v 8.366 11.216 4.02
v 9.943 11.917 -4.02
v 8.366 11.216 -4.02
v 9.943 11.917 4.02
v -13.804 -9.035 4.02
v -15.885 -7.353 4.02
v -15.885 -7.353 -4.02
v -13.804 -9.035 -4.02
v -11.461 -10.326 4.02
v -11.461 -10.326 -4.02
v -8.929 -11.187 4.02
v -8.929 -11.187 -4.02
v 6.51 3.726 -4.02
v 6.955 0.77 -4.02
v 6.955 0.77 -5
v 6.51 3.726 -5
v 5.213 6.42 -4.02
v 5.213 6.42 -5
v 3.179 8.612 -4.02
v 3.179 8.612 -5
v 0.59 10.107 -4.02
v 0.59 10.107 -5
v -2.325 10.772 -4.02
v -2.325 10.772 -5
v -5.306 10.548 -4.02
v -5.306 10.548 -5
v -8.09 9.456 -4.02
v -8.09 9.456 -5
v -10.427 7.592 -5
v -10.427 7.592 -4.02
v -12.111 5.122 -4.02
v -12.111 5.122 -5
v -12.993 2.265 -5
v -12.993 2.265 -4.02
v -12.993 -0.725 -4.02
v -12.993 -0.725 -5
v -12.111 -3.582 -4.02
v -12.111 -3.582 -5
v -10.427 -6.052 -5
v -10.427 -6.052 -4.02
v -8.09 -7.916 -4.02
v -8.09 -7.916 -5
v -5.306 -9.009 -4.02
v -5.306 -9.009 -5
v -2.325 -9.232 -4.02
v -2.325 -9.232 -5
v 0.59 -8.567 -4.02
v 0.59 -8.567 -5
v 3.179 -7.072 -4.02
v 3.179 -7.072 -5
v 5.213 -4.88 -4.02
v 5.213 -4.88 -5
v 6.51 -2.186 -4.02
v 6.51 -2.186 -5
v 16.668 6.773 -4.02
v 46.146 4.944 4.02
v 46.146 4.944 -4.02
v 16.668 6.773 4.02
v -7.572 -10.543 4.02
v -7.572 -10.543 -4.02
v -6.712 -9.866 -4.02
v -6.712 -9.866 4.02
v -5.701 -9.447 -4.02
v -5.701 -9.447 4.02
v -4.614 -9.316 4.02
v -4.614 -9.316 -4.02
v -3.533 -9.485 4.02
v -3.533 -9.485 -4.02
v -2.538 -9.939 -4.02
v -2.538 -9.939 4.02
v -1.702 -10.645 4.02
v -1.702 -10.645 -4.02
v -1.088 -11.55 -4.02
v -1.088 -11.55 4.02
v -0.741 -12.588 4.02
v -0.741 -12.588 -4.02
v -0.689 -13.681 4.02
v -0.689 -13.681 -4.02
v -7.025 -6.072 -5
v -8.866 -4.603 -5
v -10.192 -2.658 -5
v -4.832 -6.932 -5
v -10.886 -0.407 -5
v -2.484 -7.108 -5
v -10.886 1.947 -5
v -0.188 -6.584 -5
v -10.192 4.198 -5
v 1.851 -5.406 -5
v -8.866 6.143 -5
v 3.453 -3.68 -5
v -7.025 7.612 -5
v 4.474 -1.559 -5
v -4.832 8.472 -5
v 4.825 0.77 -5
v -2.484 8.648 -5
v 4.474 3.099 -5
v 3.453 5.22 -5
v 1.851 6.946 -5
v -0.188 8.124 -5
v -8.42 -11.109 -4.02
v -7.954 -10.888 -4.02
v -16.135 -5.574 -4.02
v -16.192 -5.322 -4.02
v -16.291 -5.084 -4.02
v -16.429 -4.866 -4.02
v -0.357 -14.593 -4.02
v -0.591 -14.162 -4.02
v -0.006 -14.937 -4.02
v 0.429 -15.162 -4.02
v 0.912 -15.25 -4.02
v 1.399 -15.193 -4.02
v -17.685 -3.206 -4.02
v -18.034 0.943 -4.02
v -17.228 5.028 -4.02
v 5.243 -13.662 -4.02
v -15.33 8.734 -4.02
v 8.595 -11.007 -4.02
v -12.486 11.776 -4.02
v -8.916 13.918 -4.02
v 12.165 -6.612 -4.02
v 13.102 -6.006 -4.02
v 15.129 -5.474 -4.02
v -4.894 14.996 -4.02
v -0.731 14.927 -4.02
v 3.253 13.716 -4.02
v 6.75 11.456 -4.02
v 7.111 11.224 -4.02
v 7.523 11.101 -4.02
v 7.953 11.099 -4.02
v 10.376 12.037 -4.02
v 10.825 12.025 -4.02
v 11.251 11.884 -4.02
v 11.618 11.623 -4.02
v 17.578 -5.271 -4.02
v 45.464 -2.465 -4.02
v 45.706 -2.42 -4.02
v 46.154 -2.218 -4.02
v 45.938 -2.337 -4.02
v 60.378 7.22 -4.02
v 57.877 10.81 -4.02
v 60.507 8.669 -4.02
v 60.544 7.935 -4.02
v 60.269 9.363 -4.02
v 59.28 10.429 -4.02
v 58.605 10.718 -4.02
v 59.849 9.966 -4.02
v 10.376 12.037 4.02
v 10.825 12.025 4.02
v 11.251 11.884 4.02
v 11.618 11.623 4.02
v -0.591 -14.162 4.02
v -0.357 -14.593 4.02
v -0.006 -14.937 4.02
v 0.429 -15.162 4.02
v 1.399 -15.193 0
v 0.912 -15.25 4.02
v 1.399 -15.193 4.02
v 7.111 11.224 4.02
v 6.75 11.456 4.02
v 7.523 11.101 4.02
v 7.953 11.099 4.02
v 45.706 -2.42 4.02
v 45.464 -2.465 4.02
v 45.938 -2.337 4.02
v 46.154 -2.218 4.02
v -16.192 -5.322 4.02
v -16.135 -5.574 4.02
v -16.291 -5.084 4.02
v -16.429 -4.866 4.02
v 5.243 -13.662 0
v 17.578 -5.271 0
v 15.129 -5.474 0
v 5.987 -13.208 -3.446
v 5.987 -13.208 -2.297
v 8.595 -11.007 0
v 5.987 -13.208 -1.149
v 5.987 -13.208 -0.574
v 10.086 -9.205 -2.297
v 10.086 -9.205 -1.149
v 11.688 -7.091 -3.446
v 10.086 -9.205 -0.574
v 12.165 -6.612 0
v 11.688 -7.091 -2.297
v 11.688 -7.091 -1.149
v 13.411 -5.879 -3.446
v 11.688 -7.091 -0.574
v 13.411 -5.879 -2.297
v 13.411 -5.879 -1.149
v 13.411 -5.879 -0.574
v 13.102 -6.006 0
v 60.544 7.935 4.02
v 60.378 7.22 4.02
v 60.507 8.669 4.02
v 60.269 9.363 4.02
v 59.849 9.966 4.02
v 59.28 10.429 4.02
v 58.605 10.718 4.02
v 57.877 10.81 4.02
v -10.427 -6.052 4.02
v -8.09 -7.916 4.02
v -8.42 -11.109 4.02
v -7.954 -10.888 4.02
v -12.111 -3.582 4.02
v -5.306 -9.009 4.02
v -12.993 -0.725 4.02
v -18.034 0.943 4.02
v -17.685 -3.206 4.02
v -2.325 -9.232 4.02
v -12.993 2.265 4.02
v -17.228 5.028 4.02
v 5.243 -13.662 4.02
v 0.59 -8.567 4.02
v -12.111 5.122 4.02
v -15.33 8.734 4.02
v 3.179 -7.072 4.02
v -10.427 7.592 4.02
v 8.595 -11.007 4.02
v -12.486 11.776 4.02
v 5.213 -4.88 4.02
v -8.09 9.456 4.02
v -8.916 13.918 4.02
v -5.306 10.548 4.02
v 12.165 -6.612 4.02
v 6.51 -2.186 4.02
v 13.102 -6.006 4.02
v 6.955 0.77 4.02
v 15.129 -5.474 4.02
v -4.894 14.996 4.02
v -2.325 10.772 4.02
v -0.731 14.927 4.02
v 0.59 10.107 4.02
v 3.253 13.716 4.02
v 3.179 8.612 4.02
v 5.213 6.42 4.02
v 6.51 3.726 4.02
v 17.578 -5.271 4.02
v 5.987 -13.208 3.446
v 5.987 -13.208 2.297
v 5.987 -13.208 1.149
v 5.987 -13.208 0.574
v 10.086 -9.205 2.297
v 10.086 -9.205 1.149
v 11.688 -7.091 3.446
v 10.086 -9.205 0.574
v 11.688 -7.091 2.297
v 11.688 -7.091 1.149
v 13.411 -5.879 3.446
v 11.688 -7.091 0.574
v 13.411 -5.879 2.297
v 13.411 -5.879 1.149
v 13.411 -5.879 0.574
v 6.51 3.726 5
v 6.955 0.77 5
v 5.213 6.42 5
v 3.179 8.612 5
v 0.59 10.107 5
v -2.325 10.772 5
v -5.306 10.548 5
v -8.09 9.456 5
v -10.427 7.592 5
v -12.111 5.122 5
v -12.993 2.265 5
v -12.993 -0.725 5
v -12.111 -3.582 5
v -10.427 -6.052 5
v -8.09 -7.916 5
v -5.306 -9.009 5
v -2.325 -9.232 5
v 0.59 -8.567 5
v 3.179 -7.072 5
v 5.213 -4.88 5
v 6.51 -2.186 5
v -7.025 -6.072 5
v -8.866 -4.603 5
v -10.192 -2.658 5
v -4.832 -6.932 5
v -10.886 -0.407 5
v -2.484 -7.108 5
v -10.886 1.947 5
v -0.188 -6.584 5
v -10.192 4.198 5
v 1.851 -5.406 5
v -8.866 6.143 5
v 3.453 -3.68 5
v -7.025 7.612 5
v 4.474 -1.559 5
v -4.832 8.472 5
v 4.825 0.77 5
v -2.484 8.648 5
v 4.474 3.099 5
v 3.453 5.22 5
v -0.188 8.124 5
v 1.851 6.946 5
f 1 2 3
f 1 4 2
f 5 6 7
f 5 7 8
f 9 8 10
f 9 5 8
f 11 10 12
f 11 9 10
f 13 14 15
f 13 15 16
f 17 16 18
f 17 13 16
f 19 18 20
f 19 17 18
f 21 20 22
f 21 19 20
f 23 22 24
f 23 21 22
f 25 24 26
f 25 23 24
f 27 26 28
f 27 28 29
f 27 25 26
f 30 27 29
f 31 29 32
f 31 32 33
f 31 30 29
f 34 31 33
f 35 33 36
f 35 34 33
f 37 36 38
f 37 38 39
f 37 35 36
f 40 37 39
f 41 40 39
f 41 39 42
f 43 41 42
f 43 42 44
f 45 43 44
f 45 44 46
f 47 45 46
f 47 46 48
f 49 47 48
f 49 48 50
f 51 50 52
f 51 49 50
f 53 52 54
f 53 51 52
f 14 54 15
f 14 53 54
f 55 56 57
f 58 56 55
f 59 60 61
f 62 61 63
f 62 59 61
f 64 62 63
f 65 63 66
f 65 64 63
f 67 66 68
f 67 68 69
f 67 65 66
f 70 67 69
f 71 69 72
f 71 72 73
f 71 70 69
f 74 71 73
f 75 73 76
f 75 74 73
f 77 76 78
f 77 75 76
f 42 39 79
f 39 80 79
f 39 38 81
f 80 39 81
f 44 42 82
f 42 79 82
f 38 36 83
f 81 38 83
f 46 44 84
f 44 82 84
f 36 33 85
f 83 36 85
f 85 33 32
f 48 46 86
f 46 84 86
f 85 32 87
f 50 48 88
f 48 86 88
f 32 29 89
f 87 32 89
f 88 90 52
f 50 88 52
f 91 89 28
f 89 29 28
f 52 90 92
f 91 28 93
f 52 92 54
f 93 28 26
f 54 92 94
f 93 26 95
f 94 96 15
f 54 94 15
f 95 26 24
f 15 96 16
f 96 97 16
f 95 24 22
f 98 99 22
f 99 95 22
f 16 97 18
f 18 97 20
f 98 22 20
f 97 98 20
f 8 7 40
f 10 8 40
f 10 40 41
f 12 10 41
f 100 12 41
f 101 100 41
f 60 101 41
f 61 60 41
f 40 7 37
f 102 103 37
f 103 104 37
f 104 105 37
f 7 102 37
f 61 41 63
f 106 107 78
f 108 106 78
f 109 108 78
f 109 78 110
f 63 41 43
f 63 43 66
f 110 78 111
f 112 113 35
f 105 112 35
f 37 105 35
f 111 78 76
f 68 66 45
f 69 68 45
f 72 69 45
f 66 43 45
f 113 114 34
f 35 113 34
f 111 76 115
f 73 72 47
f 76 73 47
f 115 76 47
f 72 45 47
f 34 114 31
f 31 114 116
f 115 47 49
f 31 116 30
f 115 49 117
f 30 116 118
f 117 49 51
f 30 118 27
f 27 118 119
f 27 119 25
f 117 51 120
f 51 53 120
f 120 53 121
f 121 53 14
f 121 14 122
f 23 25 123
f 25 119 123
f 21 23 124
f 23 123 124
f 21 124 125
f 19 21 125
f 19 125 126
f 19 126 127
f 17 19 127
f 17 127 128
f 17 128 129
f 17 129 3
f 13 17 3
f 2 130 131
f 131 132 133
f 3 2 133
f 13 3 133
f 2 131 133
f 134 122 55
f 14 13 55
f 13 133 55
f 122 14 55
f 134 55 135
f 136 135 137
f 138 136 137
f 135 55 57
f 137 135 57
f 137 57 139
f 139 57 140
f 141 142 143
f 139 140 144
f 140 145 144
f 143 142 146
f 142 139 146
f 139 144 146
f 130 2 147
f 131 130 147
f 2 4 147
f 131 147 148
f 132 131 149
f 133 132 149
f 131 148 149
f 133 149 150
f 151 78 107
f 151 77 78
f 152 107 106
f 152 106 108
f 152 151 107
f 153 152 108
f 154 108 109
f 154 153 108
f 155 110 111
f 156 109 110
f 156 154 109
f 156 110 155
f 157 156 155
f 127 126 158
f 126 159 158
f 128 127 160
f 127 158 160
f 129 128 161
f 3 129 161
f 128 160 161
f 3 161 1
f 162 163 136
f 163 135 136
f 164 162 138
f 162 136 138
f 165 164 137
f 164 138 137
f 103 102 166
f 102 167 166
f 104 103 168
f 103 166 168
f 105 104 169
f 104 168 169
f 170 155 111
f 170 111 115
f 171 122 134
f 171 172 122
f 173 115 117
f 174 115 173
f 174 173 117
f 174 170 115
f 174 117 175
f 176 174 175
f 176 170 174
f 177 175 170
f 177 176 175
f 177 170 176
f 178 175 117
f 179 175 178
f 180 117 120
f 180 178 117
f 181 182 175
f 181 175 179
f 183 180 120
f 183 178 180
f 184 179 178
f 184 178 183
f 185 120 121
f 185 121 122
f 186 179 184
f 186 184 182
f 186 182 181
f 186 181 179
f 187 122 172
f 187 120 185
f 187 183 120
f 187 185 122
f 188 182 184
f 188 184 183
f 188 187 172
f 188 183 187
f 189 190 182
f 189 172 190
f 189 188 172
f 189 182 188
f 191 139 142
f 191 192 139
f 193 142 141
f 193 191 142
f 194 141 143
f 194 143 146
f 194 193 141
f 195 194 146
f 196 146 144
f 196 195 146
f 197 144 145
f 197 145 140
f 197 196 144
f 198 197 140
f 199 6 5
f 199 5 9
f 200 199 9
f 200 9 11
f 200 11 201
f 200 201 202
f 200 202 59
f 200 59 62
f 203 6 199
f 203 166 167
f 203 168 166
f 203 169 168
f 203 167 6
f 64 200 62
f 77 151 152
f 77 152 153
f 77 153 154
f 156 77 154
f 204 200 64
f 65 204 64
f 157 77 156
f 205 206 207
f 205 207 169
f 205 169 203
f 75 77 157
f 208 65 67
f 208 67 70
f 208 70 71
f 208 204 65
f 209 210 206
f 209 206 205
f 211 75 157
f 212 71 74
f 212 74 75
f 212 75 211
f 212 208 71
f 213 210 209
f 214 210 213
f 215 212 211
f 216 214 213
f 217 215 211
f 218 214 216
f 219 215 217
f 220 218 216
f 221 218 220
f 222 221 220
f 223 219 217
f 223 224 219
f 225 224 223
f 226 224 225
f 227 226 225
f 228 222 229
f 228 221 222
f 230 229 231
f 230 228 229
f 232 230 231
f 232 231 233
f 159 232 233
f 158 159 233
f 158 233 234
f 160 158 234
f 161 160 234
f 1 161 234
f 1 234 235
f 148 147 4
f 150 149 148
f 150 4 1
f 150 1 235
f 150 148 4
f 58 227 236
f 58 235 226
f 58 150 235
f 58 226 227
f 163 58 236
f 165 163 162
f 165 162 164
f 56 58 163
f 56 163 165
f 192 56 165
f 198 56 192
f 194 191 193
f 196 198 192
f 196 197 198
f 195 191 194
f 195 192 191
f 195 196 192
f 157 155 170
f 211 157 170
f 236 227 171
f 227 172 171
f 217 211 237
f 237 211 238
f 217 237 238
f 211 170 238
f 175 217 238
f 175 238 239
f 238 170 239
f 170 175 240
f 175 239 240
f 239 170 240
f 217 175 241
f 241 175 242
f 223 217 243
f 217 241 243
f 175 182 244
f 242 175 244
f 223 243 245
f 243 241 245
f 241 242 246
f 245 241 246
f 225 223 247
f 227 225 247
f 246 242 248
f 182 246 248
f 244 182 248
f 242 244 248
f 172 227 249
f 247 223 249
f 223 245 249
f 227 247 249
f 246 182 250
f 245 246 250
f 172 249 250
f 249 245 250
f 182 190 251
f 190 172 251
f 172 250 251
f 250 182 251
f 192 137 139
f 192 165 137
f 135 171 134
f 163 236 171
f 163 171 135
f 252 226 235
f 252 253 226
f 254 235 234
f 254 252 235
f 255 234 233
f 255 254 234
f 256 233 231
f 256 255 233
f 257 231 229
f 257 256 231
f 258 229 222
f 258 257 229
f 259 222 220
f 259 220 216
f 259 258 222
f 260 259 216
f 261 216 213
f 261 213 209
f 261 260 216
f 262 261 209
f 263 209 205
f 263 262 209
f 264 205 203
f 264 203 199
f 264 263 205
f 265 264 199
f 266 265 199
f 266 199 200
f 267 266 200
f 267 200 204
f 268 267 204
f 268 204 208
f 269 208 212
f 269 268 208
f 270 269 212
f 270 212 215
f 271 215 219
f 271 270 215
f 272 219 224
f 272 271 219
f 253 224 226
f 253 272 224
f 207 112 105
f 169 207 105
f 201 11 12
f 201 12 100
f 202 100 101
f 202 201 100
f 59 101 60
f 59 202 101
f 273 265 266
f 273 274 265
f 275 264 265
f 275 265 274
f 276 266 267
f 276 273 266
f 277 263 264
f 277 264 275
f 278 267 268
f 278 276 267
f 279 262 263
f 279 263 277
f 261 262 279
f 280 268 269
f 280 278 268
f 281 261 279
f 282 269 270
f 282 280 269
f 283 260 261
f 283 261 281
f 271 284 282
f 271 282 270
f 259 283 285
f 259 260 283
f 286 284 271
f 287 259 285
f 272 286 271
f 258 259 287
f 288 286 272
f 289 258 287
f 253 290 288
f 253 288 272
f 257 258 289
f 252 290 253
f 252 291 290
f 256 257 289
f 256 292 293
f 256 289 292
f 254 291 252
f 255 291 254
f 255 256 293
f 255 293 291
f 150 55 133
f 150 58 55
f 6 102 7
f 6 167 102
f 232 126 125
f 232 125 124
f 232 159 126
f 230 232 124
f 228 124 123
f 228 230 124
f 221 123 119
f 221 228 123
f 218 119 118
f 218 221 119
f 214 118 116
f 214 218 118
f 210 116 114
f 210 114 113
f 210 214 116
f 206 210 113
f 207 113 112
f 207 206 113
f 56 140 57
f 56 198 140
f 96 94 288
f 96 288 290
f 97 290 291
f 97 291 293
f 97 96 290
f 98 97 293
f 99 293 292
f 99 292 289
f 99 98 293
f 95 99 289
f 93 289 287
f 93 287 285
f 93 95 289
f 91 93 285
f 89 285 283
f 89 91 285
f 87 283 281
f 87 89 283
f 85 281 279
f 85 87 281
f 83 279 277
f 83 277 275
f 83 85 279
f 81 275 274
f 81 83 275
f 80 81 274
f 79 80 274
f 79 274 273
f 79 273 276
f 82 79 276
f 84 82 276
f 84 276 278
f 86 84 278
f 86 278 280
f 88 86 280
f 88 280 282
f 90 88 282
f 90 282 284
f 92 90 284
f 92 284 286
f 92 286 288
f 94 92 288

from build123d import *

# Parameters (mm, degrees)
F0_R     = 7.9
F1_DEPTH = 4.02
F2_R     = 10.03
F2_R_2   = 7.9
F3_DEPTH = 5
F4_R     = 1.524


with BuildPart() as f1:
    # F0 (on Top) → F1 (new body, symmetric)
    with BuildSketch(Plane.XY):
        with BuildLine():
            Line((46.1461601803, 4.9444199044), (16.6679395434, 6.772526574))
            Line((16.6679395434, 6.772526574), (10.8789355268, 12.3330182403))
            Line((10.8789355268, 12.3330182403), (7.4512350625, 10.8095955786))
            ThreePointArc((7.4512350625, 10.8095955786), (-10.3629347072, 13.2103242145), (-17.6852336109, -3.2058897622))
            Line((-17.6852336109, -3.2058897622), (-16.1899196828, -5.1818019859))
            Line((-16.1899196828, -5.1818019859), (-15.8845459898, -7.3533461493))
            ThreePointArc((-15.8845459898, -7.3533461493), (-12.6610311769, -9.7318403738), (-8.9288197387, -11.1874777966))
            ThreePointArc((-8.9288197387, -11.1874777966), (-8.17872411, -11.0156404916), (-7.5716043744, -10.5428010492))
            ThreePointArc((-7.5716043744, -10.5428010492), (-3.0198455719, -9.6773974333), (-0.6885354025, -13.6814484455))
            ThreePointArc((-0.6885354025, -13.6814484455), (-0.0064651636, -14.9365604515), (1.3988035828, -15.1929697119))
            add(Edge.make_bspline(
                [(1.3988035828, -15.1929697119), (2.268737628, -14.9110562135), (3.968289553, -14.360236217), (6.0326052215, -13.2728896797), (8.2551576398, -11.498992535), (10.0987298539, -9.2692275408), (11.6138570475, -7.0035918777), (13.3410886509, -5.5985693686), (16.1056359582, -5.3166150456), (17.57795468, -5.2708741645)],
                knots=[0, 0, 0, 0, 0.1403793354, 0.2707223402, 0.413910691, 0.5609255525, 0.7002489917, 0.8244285886, 1, 1, 1, 1], degree=3))
            Line((17.57795468, -5.2708741645), (45.839598026, -2.4268767753))
            Line((45.839598026, -2.4268767753), (60.3782066509, 7.2202376408))
            ThreePointArc((60.3782066509, 7.2202376408), (60.0804354266, 9.6791863318), (57.8765136264, 10.8095955786))
            Line((57.8765136264, 10.8095955786), (46.1461601803, 4.9444199044))
        make_face()
        with Locations((-3.0745326542, 0.769972596)):
            Circle(F0_R, mode=Mode.SUBTRACT)
    extrude(amount=F1_DEPTH, both=True)

    # F2 (on Top) → F3 (join, symmetric)
    with BuildSketch(Plane.XY):
        with Locations((-3.0745326542, 0.769972596)):
            Circle(F2_R)
        with Locations((-3.0745326542, 0.769972596)):
            Circle(F2_R_2, mode=Mode.SUBTRACT)
    extrude(amount=F3_DEPTH, both=True)

    # F4
    f4_edges = [f1.edges().sort_by_distance(p)[0] for p in [
        (-16.18992, -5.181802, 0),
        (7.451235, 10.809596, 0),
        (10.878936, 12.333018, 0),
        (45.839598, -2.426877, 0),
    ]]
    fillet(f4_edges, radius=F4_R)


solid = f1.part
